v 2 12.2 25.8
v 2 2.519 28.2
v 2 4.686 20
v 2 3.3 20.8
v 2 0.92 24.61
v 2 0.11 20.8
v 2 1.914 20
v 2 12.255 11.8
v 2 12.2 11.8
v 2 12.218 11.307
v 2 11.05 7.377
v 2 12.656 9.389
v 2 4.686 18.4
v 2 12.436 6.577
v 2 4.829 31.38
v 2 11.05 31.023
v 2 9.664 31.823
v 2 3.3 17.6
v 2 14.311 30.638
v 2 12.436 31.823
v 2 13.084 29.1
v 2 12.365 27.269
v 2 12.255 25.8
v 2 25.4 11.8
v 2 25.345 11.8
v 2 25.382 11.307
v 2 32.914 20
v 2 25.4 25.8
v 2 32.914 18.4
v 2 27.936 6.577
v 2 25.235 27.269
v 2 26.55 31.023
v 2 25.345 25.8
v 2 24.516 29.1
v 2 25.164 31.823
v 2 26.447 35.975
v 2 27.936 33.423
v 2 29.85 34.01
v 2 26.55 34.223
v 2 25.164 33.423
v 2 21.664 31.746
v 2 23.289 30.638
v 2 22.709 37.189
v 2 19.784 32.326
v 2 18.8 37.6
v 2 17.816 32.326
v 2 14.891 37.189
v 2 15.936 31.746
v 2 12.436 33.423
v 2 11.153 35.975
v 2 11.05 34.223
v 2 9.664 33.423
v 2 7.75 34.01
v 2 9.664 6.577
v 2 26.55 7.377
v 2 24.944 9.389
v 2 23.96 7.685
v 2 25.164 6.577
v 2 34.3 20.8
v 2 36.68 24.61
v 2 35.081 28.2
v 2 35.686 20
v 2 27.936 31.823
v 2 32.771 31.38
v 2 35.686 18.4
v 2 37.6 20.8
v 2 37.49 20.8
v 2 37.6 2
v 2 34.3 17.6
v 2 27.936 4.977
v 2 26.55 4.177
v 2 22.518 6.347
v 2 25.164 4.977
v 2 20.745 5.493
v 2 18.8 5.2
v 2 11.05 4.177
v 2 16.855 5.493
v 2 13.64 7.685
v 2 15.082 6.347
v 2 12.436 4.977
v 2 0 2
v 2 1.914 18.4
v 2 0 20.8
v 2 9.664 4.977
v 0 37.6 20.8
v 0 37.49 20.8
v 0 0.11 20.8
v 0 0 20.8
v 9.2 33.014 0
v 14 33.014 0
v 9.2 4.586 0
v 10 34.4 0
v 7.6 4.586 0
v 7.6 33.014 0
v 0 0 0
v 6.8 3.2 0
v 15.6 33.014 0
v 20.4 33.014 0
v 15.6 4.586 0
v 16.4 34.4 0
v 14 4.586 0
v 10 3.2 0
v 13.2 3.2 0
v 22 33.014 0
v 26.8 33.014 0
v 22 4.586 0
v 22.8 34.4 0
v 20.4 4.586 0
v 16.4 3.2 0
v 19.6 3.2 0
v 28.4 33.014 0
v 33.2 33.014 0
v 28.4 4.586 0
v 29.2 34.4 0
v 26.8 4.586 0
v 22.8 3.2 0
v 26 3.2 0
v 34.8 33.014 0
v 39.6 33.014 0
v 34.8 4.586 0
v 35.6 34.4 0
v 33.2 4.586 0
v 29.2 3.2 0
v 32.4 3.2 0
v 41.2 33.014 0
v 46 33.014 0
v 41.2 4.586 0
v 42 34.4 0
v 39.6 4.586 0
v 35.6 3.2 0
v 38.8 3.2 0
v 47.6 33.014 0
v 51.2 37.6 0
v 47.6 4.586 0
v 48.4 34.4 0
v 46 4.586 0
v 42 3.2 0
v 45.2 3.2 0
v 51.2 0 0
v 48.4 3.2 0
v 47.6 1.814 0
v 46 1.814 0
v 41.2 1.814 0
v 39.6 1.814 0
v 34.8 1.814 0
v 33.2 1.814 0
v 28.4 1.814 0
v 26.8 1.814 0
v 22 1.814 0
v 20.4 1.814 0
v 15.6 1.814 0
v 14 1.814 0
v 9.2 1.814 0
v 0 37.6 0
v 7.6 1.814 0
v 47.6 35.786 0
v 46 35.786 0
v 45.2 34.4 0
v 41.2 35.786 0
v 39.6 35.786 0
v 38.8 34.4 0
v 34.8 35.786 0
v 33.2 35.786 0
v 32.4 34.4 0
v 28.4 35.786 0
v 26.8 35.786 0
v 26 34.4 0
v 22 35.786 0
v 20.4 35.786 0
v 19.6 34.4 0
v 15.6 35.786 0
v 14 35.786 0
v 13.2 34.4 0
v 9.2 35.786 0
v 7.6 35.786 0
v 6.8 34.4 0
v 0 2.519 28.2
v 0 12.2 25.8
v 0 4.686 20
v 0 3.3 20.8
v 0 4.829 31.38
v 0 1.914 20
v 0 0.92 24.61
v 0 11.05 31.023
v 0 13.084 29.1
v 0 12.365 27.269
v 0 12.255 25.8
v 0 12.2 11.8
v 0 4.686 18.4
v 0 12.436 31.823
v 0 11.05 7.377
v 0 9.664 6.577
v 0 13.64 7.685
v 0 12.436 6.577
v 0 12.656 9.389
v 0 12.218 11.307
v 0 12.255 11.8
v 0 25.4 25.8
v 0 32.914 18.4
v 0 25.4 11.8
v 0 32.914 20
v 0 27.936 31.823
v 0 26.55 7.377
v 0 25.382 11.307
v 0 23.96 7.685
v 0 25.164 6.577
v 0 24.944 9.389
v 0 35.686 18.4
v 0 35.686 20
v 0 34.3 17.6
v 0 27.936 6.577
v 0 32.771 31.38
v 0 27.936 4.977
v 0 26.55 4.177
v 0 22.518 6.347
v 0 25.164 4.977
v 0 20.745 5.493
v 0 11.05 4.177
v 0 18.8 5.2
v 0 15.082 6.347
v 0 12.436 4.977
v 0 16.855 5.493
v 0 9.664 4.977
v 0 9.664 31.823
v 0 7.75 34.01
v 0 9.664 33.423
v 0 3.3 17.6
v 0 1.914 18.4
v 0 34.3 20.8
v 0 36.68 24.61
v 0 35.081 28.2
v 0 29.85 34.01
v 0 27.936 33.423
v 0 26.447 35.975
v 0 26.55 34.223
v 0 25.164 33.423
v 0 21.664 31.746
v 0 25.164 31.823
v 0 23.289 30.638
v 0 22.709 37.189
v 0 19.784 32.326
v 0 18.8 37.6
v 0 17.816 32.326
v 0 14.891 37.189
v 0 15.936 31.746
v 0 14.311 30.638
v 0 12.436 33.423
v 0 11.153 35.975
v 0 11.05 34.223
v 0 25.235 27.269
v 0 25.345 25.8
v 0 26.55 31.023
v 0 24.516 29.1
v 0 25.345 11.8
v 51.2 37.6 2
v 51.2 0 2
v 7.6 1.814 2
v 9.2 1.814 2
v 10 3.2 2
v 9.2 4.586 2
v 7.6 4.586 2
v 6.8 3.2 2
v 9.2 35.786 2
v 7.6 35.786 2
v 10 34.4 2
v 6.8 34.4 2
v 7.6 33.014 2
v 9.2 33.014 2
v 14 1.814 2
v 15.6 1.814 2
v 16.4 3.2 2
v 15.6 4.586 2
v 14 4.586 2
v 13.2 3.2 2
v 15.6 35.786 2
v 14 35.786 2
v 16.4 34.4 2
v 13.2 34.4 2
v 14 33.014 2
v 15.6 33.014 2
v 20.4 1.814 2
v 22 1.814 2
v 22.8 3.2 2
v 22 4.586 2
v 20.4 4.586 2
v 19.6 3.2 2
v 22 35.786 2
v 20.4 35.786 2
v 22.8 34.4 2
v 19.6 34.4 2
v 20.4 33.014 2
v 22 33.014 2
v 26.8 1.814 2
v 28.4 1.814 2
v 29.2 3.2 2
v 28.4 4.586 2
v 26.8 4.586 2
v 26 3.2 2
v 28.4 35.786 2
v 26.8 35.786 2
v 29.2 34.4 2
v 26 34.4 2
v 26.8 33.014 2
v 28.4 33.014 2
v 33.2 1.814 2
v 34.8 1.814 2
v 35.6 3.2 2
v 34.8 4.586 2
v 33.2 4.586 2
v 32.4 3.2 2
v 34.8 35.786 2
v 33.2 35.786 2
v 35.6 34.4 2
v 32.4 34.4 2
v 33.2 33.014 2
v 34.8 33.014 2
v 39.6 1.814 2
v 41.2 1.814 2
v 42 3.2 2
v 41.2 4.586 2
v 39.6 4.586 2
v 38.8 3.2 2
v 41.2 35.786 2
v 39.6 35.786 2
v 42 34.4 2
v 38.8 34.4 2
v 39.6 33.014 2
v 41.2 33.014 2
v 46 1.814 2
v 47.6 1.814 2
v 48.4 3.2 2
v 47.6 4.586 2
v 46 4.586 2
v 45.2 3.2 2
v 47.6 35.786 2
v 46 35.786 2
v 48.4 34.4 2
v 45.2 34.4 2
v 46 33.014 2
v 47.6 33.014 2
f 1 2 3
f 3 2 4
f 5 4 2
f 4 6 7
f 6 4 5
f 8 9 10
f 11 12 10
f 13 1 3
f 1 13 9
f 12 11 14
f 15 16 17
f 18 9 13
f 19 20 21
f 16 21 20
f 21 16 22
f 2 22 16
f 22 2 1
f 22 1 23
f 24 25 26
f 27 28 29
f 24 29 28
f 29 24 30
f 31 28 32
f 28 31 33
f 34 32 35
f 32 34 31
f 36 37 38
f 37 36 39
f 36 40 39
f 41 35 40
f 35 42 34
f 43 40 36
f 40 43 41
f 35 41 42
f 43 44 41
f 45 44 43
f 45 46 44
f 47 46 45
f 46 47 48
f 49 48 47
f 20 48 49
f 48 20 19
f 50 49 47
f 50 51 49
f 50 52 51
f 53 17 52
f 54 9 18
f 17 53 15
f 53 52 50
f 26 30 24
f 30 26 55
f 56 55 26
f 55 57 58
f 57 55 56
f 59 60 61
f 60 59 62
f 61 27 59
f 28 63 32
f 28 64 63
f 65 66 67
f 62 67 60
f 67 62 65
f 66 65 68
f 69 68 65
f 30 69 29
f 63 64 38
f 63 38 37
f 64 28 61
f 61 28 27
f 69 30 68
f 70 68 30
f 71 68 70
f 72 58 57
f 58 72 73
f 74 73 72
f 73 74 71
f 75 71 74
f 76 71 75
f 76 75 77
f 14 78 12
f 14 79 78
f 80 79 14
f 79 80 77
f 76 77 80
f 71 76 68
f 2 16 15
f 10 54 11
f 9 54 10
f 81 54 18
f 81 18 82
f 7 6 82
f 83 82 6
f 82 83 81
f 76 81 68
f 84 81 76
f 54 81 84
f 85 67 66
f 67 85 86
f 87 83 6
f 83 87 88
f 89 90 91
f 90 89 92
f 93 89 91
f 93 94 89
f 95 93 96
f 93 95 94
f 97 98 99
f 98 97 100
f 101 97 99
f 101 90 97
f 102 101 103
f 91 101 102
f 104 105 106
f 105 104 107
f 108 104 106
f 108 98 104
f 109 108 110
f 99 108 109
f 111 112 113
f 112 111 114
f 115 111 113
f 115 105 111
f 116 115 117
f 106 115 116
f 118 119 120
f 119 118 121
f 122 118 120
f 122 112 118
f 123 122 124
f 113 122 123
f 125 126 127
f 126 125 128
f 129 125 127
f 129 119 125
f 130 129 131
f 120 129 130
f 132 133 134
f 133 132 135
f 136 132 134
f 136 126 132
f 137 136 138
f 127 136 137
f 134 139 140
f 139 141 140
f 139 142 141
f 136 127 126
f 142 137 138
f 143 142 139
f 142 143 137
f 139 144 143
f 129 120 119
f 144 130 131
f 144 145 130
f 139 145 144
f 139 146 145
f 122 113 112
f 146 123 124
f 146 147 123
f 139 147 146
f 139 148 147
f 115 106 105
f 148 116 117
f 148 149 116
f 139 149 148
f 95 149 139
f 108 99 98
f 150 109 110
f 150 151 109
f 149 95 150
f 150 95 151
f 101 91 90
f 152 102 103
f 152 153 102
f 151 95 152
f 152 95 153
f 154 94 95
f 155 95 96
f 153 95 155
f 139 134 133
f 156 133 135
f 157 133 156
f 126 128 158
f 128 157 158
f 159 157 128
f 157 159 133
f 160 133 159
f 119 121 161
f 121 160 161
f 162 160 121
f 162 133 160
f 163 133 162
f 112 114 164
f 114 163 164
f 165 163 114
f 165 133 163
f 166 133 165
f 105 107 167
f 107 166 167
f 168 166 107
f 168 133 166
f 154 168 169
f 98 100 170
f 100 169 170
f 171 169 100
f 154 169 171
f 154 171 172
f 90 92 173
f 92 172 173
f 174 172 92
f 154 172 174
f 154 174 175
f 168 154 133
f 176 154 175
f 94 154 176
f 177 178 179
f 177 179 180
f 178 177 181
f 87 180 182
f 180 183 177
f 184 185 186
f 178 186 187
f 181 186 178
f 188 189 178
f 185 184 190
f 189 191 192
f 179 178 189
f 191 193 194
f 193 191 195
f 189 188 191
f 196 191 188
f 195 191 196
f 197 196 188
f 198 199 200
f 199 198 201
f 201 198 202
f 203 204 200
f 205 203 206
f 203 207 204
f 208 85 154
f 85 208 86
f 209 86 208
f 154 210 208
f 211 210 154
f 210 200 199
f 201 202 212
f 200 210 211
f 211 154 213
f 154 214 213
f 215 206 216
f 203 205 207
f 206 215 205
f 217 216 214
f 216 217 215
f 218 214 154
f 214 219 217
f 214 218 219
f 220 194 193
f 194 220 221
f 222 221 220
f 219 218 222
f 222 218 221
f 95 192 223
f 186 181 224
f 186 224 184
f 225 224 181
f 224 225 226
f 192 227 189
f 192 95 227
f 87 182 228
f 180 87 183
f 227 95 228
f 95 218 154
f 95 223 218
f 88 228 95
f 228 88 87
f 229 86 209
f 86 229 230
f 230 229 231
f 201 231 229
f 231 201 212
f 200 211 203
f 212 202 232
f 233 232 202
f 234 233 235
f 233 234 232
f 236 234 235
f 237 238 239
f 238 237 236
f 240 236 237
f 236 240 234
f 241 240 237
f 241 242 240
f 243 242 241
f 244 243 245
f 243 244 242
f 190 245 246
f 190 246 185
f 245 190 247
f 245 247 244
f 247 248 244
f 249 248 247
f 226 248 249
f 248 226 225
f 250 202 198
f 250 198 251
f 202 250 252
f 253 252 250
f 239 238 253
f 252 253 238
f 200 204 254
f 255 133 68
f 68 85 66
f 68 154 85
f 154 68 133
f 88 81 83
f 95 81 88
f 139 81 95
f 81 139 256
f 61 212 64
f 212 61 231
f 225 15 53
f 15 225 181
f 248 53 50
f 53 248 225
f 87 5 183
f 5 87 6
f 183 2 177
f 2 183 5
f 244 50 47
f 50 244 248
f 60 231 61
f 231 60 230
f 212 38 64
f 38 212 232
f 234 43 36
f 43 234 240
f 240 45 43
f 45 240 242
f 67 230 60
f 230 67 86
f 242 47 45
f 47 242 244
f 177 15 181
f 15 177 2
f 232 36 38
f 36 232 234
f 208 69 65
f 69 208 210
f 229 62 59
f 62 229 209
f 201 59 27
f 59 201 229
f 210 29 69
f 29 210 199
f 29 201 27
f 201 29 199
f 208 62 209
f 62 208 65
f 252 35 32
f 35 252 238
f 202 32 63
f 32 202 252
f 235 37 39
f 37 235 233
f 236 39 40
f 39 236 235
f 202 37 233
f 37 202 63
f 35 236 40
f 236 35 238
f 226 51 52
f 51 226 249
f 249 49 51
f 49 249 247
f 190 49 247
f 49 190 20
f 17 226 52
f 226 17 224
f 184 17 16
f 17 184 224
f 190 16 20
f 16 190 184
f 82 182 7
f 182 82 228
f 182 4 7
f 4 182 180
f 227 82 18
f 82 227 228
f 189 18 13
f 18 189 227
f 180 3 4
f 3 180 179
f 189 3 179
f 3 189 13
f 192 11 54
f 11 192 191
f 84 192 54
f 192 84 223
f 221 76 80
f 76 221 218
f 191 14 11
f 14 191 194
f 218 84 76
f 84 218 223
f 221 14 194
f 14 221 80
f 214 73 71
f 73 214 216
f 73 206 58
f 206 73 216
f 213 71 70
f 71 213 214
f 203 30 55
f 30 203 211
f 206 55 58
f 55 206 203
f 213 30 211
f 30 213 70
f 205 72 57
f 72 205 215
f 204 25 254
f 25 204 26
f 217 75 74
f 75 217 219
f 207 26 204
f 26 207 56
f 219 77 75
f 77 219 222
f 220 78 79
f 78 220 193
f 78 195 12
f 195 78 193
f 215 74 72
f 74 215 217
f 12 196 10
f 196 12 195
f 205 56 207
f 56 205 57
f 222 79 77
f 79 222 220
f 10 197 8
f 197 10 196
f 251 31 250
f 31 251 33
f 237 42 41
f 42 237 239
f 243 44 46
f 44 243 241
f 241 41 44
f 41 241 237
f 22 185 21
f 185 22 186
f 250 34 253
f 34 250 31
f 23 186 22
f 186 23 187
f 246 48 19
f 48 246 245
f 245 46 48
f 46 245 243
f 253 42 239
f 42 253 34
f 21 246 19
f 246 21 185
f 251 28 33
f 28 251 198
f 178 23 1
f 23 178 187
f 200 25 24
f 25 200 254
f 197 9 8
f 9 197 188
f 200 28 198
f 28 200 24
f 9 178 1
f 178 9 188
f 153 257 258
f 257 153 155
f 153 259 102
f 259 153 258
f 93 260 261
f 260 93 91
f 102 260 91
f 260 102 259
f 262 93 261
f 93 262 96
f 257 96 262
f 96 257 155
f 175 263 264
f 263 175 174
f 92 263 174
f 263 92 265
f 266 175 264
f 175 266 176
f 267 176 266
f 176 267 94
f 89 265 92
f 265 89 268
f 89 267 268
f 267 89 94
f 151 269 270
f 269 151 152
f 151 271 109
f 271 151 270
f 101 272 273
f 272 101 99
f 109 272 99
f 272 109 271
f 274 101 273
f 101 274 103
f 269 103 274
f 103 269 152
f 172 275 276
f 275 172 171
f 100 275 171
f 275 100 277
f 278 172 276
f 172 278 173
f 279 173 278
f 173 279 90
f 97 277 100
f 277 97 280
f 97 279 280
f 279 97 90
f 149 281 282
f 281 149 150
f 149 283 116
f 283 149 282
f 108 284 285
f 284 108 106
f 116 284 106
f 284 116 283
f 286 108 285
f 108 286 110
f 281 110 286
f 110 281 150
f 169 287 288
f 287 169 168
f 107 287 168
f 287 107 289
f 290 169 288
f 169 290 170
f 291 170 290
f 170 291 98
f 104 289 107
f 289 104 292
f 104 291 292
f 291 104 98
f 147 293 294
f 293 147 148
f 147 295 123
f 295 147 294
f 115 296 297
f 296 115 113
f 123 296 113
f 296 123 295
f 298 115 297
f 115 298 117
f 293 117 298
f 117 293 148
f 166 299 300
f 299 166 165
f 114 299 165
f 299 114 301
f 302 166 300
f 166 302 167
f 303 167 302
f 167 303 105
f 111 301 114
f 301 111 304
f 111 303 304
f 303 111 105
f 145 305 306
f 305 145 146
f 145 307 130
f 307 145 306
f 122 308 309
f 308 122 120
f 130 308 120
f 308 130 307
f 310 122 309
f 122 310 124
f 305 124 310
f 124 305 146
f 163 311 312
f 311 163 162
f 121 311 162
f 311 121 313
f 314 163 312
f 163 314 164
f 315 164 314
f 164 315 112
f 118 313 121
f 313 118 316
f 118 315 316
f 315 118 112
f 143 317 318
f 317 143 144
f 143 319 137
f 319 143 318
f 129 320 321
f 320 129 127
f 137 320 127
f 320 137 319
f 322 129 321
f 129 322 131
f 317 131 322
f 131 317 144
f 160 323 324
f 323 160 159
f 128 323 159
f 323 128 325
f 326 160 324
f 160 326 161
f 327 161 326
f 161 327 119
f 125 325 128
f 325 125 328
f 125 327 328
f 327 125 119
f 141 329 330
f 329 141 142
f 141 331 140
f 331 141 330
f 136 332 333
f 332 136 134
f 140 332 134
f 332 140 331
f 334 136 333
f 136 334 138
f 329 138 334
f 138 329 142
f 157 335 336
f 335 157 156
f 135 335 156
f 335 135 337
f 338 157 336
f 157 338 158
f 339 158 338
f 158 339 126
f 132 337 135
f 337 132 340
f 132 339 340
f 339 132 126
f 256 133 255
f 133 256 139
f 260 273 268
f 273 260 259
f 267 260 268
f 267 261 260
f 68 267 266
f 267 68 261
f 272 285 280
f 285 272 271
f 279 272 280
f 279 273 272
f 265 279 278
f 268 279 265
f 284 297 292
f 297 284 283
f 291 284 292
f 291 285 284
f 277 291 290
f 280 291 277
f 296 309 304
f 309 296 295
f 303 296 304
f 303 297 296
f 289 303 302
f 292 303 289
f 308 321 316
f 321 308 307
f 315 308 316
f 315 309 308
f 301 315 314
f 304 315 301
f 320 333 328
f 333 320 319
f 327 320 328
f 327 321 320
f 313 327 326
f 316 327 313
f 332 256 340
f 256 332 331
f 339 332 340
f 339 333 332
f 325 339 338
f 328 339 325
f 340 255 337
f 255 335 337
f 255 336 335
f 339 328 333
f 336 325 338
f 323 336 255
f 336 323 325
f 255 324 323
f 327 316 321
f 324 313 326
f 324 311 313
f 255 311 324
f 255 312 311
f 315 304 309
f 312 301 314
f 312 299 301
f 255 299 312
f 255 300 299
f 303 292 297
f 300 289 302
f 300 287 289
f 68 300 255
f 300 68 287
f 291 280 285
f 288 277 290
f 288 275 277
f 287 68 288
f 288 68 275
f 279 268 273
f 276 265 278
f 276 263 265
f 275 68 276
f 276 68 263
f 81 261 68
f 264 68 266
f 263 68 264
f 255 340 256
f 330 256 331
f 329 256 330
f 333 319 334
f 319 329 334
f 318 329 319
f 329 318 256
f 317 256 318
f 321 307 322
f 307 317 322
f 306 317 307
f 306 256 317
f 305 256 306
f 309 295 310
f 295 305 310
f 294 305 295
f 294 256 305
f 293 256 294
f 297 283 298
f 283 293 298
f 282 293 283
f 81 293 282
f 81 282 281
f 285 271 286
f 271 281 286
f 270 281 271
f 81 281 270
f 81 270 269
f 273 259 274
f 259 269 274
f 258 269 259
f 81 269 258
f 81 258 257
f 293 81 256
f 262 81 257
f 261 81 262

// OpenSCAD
width = 37.6;
thickness = 2;
mounting_hole_radius = 3.2 / 2;

bottom_length = 49.2;
side_hole_radius = 13.2 / 2;
side_hole_distance = 14;
side_hole_spacing_radius = 31 / 2;

bottom_hole_spacing_x = 6.4;
bottom_hole_spacing_y = 31.2;
bottom_hole_offset_x = 6.4;	// misprint?
bottom_hole_offset_y = (width - bottom_hole_spacing_y) / 2;

bracket();

module bracket(){
	difference() {
		side();
		translate([0, width / 2 - side_hole_radius, width / 2 - side_hole_distance / 2]) side_hole();
	}

	translate([thickness, 0, 0]) bottom();
}

module side() {
	difference() {
		union(){
			cube([thickness, width, width / 2 + thickness]);
			translate([0, width / 2, width / 2]){
				rotate([0, 90, 0]){
					cylinder(r = width / 2, h = thickness);
				}
			}
		}
		side_mounting_holes();
	}
}

module bottom() {
	difference() {
		cube([bottom_length, width, thickness]);
		translate([bottom_hole_offset_x, bottom_hole_offset_y, 0]) bottom_mounting_holes();
	}	
}

module bottom_mounting_holes(){
	for (i = [0:6]){
		translate([i * bottom_hole_spacing_x, 0, 0]){
			cylinder(r=mounting_hole_radius, h=thickness + 1);
			translate([0, bottom_hole_spacing_y, 0]){
				cylinder(r=mounting_hole_radius, h=thickness + 1);
			}
		}
	}
}

module side_mounting_holes() {
	translate([0, width / 2, width / 2 + thickness - mounting_hole_radius]){
		for (i = [0:5]){
			rotate([60 * i, 0, 0]) {
				translate([0, side_hole_spacing_radius, 0]){
					rotate([0,90,0]){
						cylinder(r=mounting_hole_radius, h=thickness+4);
					}
				}
			}
		}
	}
}

module side_hole() {
	cube([thickness + 1, side_hole_radius * 2, side_hole_distance]);

	translate([0, side_hole_radius, 0]){
		rotate([0, 90, 0]){
			cylinder(r=side_hole_radius, h=thickness + 1);
		}
		translate([0, 0, side_hole_distance]){
			rotate([0, 90, 0]){
				cylinder(r=side_hole_radius, h=thickness + 1);
			}
		}
	}
}
